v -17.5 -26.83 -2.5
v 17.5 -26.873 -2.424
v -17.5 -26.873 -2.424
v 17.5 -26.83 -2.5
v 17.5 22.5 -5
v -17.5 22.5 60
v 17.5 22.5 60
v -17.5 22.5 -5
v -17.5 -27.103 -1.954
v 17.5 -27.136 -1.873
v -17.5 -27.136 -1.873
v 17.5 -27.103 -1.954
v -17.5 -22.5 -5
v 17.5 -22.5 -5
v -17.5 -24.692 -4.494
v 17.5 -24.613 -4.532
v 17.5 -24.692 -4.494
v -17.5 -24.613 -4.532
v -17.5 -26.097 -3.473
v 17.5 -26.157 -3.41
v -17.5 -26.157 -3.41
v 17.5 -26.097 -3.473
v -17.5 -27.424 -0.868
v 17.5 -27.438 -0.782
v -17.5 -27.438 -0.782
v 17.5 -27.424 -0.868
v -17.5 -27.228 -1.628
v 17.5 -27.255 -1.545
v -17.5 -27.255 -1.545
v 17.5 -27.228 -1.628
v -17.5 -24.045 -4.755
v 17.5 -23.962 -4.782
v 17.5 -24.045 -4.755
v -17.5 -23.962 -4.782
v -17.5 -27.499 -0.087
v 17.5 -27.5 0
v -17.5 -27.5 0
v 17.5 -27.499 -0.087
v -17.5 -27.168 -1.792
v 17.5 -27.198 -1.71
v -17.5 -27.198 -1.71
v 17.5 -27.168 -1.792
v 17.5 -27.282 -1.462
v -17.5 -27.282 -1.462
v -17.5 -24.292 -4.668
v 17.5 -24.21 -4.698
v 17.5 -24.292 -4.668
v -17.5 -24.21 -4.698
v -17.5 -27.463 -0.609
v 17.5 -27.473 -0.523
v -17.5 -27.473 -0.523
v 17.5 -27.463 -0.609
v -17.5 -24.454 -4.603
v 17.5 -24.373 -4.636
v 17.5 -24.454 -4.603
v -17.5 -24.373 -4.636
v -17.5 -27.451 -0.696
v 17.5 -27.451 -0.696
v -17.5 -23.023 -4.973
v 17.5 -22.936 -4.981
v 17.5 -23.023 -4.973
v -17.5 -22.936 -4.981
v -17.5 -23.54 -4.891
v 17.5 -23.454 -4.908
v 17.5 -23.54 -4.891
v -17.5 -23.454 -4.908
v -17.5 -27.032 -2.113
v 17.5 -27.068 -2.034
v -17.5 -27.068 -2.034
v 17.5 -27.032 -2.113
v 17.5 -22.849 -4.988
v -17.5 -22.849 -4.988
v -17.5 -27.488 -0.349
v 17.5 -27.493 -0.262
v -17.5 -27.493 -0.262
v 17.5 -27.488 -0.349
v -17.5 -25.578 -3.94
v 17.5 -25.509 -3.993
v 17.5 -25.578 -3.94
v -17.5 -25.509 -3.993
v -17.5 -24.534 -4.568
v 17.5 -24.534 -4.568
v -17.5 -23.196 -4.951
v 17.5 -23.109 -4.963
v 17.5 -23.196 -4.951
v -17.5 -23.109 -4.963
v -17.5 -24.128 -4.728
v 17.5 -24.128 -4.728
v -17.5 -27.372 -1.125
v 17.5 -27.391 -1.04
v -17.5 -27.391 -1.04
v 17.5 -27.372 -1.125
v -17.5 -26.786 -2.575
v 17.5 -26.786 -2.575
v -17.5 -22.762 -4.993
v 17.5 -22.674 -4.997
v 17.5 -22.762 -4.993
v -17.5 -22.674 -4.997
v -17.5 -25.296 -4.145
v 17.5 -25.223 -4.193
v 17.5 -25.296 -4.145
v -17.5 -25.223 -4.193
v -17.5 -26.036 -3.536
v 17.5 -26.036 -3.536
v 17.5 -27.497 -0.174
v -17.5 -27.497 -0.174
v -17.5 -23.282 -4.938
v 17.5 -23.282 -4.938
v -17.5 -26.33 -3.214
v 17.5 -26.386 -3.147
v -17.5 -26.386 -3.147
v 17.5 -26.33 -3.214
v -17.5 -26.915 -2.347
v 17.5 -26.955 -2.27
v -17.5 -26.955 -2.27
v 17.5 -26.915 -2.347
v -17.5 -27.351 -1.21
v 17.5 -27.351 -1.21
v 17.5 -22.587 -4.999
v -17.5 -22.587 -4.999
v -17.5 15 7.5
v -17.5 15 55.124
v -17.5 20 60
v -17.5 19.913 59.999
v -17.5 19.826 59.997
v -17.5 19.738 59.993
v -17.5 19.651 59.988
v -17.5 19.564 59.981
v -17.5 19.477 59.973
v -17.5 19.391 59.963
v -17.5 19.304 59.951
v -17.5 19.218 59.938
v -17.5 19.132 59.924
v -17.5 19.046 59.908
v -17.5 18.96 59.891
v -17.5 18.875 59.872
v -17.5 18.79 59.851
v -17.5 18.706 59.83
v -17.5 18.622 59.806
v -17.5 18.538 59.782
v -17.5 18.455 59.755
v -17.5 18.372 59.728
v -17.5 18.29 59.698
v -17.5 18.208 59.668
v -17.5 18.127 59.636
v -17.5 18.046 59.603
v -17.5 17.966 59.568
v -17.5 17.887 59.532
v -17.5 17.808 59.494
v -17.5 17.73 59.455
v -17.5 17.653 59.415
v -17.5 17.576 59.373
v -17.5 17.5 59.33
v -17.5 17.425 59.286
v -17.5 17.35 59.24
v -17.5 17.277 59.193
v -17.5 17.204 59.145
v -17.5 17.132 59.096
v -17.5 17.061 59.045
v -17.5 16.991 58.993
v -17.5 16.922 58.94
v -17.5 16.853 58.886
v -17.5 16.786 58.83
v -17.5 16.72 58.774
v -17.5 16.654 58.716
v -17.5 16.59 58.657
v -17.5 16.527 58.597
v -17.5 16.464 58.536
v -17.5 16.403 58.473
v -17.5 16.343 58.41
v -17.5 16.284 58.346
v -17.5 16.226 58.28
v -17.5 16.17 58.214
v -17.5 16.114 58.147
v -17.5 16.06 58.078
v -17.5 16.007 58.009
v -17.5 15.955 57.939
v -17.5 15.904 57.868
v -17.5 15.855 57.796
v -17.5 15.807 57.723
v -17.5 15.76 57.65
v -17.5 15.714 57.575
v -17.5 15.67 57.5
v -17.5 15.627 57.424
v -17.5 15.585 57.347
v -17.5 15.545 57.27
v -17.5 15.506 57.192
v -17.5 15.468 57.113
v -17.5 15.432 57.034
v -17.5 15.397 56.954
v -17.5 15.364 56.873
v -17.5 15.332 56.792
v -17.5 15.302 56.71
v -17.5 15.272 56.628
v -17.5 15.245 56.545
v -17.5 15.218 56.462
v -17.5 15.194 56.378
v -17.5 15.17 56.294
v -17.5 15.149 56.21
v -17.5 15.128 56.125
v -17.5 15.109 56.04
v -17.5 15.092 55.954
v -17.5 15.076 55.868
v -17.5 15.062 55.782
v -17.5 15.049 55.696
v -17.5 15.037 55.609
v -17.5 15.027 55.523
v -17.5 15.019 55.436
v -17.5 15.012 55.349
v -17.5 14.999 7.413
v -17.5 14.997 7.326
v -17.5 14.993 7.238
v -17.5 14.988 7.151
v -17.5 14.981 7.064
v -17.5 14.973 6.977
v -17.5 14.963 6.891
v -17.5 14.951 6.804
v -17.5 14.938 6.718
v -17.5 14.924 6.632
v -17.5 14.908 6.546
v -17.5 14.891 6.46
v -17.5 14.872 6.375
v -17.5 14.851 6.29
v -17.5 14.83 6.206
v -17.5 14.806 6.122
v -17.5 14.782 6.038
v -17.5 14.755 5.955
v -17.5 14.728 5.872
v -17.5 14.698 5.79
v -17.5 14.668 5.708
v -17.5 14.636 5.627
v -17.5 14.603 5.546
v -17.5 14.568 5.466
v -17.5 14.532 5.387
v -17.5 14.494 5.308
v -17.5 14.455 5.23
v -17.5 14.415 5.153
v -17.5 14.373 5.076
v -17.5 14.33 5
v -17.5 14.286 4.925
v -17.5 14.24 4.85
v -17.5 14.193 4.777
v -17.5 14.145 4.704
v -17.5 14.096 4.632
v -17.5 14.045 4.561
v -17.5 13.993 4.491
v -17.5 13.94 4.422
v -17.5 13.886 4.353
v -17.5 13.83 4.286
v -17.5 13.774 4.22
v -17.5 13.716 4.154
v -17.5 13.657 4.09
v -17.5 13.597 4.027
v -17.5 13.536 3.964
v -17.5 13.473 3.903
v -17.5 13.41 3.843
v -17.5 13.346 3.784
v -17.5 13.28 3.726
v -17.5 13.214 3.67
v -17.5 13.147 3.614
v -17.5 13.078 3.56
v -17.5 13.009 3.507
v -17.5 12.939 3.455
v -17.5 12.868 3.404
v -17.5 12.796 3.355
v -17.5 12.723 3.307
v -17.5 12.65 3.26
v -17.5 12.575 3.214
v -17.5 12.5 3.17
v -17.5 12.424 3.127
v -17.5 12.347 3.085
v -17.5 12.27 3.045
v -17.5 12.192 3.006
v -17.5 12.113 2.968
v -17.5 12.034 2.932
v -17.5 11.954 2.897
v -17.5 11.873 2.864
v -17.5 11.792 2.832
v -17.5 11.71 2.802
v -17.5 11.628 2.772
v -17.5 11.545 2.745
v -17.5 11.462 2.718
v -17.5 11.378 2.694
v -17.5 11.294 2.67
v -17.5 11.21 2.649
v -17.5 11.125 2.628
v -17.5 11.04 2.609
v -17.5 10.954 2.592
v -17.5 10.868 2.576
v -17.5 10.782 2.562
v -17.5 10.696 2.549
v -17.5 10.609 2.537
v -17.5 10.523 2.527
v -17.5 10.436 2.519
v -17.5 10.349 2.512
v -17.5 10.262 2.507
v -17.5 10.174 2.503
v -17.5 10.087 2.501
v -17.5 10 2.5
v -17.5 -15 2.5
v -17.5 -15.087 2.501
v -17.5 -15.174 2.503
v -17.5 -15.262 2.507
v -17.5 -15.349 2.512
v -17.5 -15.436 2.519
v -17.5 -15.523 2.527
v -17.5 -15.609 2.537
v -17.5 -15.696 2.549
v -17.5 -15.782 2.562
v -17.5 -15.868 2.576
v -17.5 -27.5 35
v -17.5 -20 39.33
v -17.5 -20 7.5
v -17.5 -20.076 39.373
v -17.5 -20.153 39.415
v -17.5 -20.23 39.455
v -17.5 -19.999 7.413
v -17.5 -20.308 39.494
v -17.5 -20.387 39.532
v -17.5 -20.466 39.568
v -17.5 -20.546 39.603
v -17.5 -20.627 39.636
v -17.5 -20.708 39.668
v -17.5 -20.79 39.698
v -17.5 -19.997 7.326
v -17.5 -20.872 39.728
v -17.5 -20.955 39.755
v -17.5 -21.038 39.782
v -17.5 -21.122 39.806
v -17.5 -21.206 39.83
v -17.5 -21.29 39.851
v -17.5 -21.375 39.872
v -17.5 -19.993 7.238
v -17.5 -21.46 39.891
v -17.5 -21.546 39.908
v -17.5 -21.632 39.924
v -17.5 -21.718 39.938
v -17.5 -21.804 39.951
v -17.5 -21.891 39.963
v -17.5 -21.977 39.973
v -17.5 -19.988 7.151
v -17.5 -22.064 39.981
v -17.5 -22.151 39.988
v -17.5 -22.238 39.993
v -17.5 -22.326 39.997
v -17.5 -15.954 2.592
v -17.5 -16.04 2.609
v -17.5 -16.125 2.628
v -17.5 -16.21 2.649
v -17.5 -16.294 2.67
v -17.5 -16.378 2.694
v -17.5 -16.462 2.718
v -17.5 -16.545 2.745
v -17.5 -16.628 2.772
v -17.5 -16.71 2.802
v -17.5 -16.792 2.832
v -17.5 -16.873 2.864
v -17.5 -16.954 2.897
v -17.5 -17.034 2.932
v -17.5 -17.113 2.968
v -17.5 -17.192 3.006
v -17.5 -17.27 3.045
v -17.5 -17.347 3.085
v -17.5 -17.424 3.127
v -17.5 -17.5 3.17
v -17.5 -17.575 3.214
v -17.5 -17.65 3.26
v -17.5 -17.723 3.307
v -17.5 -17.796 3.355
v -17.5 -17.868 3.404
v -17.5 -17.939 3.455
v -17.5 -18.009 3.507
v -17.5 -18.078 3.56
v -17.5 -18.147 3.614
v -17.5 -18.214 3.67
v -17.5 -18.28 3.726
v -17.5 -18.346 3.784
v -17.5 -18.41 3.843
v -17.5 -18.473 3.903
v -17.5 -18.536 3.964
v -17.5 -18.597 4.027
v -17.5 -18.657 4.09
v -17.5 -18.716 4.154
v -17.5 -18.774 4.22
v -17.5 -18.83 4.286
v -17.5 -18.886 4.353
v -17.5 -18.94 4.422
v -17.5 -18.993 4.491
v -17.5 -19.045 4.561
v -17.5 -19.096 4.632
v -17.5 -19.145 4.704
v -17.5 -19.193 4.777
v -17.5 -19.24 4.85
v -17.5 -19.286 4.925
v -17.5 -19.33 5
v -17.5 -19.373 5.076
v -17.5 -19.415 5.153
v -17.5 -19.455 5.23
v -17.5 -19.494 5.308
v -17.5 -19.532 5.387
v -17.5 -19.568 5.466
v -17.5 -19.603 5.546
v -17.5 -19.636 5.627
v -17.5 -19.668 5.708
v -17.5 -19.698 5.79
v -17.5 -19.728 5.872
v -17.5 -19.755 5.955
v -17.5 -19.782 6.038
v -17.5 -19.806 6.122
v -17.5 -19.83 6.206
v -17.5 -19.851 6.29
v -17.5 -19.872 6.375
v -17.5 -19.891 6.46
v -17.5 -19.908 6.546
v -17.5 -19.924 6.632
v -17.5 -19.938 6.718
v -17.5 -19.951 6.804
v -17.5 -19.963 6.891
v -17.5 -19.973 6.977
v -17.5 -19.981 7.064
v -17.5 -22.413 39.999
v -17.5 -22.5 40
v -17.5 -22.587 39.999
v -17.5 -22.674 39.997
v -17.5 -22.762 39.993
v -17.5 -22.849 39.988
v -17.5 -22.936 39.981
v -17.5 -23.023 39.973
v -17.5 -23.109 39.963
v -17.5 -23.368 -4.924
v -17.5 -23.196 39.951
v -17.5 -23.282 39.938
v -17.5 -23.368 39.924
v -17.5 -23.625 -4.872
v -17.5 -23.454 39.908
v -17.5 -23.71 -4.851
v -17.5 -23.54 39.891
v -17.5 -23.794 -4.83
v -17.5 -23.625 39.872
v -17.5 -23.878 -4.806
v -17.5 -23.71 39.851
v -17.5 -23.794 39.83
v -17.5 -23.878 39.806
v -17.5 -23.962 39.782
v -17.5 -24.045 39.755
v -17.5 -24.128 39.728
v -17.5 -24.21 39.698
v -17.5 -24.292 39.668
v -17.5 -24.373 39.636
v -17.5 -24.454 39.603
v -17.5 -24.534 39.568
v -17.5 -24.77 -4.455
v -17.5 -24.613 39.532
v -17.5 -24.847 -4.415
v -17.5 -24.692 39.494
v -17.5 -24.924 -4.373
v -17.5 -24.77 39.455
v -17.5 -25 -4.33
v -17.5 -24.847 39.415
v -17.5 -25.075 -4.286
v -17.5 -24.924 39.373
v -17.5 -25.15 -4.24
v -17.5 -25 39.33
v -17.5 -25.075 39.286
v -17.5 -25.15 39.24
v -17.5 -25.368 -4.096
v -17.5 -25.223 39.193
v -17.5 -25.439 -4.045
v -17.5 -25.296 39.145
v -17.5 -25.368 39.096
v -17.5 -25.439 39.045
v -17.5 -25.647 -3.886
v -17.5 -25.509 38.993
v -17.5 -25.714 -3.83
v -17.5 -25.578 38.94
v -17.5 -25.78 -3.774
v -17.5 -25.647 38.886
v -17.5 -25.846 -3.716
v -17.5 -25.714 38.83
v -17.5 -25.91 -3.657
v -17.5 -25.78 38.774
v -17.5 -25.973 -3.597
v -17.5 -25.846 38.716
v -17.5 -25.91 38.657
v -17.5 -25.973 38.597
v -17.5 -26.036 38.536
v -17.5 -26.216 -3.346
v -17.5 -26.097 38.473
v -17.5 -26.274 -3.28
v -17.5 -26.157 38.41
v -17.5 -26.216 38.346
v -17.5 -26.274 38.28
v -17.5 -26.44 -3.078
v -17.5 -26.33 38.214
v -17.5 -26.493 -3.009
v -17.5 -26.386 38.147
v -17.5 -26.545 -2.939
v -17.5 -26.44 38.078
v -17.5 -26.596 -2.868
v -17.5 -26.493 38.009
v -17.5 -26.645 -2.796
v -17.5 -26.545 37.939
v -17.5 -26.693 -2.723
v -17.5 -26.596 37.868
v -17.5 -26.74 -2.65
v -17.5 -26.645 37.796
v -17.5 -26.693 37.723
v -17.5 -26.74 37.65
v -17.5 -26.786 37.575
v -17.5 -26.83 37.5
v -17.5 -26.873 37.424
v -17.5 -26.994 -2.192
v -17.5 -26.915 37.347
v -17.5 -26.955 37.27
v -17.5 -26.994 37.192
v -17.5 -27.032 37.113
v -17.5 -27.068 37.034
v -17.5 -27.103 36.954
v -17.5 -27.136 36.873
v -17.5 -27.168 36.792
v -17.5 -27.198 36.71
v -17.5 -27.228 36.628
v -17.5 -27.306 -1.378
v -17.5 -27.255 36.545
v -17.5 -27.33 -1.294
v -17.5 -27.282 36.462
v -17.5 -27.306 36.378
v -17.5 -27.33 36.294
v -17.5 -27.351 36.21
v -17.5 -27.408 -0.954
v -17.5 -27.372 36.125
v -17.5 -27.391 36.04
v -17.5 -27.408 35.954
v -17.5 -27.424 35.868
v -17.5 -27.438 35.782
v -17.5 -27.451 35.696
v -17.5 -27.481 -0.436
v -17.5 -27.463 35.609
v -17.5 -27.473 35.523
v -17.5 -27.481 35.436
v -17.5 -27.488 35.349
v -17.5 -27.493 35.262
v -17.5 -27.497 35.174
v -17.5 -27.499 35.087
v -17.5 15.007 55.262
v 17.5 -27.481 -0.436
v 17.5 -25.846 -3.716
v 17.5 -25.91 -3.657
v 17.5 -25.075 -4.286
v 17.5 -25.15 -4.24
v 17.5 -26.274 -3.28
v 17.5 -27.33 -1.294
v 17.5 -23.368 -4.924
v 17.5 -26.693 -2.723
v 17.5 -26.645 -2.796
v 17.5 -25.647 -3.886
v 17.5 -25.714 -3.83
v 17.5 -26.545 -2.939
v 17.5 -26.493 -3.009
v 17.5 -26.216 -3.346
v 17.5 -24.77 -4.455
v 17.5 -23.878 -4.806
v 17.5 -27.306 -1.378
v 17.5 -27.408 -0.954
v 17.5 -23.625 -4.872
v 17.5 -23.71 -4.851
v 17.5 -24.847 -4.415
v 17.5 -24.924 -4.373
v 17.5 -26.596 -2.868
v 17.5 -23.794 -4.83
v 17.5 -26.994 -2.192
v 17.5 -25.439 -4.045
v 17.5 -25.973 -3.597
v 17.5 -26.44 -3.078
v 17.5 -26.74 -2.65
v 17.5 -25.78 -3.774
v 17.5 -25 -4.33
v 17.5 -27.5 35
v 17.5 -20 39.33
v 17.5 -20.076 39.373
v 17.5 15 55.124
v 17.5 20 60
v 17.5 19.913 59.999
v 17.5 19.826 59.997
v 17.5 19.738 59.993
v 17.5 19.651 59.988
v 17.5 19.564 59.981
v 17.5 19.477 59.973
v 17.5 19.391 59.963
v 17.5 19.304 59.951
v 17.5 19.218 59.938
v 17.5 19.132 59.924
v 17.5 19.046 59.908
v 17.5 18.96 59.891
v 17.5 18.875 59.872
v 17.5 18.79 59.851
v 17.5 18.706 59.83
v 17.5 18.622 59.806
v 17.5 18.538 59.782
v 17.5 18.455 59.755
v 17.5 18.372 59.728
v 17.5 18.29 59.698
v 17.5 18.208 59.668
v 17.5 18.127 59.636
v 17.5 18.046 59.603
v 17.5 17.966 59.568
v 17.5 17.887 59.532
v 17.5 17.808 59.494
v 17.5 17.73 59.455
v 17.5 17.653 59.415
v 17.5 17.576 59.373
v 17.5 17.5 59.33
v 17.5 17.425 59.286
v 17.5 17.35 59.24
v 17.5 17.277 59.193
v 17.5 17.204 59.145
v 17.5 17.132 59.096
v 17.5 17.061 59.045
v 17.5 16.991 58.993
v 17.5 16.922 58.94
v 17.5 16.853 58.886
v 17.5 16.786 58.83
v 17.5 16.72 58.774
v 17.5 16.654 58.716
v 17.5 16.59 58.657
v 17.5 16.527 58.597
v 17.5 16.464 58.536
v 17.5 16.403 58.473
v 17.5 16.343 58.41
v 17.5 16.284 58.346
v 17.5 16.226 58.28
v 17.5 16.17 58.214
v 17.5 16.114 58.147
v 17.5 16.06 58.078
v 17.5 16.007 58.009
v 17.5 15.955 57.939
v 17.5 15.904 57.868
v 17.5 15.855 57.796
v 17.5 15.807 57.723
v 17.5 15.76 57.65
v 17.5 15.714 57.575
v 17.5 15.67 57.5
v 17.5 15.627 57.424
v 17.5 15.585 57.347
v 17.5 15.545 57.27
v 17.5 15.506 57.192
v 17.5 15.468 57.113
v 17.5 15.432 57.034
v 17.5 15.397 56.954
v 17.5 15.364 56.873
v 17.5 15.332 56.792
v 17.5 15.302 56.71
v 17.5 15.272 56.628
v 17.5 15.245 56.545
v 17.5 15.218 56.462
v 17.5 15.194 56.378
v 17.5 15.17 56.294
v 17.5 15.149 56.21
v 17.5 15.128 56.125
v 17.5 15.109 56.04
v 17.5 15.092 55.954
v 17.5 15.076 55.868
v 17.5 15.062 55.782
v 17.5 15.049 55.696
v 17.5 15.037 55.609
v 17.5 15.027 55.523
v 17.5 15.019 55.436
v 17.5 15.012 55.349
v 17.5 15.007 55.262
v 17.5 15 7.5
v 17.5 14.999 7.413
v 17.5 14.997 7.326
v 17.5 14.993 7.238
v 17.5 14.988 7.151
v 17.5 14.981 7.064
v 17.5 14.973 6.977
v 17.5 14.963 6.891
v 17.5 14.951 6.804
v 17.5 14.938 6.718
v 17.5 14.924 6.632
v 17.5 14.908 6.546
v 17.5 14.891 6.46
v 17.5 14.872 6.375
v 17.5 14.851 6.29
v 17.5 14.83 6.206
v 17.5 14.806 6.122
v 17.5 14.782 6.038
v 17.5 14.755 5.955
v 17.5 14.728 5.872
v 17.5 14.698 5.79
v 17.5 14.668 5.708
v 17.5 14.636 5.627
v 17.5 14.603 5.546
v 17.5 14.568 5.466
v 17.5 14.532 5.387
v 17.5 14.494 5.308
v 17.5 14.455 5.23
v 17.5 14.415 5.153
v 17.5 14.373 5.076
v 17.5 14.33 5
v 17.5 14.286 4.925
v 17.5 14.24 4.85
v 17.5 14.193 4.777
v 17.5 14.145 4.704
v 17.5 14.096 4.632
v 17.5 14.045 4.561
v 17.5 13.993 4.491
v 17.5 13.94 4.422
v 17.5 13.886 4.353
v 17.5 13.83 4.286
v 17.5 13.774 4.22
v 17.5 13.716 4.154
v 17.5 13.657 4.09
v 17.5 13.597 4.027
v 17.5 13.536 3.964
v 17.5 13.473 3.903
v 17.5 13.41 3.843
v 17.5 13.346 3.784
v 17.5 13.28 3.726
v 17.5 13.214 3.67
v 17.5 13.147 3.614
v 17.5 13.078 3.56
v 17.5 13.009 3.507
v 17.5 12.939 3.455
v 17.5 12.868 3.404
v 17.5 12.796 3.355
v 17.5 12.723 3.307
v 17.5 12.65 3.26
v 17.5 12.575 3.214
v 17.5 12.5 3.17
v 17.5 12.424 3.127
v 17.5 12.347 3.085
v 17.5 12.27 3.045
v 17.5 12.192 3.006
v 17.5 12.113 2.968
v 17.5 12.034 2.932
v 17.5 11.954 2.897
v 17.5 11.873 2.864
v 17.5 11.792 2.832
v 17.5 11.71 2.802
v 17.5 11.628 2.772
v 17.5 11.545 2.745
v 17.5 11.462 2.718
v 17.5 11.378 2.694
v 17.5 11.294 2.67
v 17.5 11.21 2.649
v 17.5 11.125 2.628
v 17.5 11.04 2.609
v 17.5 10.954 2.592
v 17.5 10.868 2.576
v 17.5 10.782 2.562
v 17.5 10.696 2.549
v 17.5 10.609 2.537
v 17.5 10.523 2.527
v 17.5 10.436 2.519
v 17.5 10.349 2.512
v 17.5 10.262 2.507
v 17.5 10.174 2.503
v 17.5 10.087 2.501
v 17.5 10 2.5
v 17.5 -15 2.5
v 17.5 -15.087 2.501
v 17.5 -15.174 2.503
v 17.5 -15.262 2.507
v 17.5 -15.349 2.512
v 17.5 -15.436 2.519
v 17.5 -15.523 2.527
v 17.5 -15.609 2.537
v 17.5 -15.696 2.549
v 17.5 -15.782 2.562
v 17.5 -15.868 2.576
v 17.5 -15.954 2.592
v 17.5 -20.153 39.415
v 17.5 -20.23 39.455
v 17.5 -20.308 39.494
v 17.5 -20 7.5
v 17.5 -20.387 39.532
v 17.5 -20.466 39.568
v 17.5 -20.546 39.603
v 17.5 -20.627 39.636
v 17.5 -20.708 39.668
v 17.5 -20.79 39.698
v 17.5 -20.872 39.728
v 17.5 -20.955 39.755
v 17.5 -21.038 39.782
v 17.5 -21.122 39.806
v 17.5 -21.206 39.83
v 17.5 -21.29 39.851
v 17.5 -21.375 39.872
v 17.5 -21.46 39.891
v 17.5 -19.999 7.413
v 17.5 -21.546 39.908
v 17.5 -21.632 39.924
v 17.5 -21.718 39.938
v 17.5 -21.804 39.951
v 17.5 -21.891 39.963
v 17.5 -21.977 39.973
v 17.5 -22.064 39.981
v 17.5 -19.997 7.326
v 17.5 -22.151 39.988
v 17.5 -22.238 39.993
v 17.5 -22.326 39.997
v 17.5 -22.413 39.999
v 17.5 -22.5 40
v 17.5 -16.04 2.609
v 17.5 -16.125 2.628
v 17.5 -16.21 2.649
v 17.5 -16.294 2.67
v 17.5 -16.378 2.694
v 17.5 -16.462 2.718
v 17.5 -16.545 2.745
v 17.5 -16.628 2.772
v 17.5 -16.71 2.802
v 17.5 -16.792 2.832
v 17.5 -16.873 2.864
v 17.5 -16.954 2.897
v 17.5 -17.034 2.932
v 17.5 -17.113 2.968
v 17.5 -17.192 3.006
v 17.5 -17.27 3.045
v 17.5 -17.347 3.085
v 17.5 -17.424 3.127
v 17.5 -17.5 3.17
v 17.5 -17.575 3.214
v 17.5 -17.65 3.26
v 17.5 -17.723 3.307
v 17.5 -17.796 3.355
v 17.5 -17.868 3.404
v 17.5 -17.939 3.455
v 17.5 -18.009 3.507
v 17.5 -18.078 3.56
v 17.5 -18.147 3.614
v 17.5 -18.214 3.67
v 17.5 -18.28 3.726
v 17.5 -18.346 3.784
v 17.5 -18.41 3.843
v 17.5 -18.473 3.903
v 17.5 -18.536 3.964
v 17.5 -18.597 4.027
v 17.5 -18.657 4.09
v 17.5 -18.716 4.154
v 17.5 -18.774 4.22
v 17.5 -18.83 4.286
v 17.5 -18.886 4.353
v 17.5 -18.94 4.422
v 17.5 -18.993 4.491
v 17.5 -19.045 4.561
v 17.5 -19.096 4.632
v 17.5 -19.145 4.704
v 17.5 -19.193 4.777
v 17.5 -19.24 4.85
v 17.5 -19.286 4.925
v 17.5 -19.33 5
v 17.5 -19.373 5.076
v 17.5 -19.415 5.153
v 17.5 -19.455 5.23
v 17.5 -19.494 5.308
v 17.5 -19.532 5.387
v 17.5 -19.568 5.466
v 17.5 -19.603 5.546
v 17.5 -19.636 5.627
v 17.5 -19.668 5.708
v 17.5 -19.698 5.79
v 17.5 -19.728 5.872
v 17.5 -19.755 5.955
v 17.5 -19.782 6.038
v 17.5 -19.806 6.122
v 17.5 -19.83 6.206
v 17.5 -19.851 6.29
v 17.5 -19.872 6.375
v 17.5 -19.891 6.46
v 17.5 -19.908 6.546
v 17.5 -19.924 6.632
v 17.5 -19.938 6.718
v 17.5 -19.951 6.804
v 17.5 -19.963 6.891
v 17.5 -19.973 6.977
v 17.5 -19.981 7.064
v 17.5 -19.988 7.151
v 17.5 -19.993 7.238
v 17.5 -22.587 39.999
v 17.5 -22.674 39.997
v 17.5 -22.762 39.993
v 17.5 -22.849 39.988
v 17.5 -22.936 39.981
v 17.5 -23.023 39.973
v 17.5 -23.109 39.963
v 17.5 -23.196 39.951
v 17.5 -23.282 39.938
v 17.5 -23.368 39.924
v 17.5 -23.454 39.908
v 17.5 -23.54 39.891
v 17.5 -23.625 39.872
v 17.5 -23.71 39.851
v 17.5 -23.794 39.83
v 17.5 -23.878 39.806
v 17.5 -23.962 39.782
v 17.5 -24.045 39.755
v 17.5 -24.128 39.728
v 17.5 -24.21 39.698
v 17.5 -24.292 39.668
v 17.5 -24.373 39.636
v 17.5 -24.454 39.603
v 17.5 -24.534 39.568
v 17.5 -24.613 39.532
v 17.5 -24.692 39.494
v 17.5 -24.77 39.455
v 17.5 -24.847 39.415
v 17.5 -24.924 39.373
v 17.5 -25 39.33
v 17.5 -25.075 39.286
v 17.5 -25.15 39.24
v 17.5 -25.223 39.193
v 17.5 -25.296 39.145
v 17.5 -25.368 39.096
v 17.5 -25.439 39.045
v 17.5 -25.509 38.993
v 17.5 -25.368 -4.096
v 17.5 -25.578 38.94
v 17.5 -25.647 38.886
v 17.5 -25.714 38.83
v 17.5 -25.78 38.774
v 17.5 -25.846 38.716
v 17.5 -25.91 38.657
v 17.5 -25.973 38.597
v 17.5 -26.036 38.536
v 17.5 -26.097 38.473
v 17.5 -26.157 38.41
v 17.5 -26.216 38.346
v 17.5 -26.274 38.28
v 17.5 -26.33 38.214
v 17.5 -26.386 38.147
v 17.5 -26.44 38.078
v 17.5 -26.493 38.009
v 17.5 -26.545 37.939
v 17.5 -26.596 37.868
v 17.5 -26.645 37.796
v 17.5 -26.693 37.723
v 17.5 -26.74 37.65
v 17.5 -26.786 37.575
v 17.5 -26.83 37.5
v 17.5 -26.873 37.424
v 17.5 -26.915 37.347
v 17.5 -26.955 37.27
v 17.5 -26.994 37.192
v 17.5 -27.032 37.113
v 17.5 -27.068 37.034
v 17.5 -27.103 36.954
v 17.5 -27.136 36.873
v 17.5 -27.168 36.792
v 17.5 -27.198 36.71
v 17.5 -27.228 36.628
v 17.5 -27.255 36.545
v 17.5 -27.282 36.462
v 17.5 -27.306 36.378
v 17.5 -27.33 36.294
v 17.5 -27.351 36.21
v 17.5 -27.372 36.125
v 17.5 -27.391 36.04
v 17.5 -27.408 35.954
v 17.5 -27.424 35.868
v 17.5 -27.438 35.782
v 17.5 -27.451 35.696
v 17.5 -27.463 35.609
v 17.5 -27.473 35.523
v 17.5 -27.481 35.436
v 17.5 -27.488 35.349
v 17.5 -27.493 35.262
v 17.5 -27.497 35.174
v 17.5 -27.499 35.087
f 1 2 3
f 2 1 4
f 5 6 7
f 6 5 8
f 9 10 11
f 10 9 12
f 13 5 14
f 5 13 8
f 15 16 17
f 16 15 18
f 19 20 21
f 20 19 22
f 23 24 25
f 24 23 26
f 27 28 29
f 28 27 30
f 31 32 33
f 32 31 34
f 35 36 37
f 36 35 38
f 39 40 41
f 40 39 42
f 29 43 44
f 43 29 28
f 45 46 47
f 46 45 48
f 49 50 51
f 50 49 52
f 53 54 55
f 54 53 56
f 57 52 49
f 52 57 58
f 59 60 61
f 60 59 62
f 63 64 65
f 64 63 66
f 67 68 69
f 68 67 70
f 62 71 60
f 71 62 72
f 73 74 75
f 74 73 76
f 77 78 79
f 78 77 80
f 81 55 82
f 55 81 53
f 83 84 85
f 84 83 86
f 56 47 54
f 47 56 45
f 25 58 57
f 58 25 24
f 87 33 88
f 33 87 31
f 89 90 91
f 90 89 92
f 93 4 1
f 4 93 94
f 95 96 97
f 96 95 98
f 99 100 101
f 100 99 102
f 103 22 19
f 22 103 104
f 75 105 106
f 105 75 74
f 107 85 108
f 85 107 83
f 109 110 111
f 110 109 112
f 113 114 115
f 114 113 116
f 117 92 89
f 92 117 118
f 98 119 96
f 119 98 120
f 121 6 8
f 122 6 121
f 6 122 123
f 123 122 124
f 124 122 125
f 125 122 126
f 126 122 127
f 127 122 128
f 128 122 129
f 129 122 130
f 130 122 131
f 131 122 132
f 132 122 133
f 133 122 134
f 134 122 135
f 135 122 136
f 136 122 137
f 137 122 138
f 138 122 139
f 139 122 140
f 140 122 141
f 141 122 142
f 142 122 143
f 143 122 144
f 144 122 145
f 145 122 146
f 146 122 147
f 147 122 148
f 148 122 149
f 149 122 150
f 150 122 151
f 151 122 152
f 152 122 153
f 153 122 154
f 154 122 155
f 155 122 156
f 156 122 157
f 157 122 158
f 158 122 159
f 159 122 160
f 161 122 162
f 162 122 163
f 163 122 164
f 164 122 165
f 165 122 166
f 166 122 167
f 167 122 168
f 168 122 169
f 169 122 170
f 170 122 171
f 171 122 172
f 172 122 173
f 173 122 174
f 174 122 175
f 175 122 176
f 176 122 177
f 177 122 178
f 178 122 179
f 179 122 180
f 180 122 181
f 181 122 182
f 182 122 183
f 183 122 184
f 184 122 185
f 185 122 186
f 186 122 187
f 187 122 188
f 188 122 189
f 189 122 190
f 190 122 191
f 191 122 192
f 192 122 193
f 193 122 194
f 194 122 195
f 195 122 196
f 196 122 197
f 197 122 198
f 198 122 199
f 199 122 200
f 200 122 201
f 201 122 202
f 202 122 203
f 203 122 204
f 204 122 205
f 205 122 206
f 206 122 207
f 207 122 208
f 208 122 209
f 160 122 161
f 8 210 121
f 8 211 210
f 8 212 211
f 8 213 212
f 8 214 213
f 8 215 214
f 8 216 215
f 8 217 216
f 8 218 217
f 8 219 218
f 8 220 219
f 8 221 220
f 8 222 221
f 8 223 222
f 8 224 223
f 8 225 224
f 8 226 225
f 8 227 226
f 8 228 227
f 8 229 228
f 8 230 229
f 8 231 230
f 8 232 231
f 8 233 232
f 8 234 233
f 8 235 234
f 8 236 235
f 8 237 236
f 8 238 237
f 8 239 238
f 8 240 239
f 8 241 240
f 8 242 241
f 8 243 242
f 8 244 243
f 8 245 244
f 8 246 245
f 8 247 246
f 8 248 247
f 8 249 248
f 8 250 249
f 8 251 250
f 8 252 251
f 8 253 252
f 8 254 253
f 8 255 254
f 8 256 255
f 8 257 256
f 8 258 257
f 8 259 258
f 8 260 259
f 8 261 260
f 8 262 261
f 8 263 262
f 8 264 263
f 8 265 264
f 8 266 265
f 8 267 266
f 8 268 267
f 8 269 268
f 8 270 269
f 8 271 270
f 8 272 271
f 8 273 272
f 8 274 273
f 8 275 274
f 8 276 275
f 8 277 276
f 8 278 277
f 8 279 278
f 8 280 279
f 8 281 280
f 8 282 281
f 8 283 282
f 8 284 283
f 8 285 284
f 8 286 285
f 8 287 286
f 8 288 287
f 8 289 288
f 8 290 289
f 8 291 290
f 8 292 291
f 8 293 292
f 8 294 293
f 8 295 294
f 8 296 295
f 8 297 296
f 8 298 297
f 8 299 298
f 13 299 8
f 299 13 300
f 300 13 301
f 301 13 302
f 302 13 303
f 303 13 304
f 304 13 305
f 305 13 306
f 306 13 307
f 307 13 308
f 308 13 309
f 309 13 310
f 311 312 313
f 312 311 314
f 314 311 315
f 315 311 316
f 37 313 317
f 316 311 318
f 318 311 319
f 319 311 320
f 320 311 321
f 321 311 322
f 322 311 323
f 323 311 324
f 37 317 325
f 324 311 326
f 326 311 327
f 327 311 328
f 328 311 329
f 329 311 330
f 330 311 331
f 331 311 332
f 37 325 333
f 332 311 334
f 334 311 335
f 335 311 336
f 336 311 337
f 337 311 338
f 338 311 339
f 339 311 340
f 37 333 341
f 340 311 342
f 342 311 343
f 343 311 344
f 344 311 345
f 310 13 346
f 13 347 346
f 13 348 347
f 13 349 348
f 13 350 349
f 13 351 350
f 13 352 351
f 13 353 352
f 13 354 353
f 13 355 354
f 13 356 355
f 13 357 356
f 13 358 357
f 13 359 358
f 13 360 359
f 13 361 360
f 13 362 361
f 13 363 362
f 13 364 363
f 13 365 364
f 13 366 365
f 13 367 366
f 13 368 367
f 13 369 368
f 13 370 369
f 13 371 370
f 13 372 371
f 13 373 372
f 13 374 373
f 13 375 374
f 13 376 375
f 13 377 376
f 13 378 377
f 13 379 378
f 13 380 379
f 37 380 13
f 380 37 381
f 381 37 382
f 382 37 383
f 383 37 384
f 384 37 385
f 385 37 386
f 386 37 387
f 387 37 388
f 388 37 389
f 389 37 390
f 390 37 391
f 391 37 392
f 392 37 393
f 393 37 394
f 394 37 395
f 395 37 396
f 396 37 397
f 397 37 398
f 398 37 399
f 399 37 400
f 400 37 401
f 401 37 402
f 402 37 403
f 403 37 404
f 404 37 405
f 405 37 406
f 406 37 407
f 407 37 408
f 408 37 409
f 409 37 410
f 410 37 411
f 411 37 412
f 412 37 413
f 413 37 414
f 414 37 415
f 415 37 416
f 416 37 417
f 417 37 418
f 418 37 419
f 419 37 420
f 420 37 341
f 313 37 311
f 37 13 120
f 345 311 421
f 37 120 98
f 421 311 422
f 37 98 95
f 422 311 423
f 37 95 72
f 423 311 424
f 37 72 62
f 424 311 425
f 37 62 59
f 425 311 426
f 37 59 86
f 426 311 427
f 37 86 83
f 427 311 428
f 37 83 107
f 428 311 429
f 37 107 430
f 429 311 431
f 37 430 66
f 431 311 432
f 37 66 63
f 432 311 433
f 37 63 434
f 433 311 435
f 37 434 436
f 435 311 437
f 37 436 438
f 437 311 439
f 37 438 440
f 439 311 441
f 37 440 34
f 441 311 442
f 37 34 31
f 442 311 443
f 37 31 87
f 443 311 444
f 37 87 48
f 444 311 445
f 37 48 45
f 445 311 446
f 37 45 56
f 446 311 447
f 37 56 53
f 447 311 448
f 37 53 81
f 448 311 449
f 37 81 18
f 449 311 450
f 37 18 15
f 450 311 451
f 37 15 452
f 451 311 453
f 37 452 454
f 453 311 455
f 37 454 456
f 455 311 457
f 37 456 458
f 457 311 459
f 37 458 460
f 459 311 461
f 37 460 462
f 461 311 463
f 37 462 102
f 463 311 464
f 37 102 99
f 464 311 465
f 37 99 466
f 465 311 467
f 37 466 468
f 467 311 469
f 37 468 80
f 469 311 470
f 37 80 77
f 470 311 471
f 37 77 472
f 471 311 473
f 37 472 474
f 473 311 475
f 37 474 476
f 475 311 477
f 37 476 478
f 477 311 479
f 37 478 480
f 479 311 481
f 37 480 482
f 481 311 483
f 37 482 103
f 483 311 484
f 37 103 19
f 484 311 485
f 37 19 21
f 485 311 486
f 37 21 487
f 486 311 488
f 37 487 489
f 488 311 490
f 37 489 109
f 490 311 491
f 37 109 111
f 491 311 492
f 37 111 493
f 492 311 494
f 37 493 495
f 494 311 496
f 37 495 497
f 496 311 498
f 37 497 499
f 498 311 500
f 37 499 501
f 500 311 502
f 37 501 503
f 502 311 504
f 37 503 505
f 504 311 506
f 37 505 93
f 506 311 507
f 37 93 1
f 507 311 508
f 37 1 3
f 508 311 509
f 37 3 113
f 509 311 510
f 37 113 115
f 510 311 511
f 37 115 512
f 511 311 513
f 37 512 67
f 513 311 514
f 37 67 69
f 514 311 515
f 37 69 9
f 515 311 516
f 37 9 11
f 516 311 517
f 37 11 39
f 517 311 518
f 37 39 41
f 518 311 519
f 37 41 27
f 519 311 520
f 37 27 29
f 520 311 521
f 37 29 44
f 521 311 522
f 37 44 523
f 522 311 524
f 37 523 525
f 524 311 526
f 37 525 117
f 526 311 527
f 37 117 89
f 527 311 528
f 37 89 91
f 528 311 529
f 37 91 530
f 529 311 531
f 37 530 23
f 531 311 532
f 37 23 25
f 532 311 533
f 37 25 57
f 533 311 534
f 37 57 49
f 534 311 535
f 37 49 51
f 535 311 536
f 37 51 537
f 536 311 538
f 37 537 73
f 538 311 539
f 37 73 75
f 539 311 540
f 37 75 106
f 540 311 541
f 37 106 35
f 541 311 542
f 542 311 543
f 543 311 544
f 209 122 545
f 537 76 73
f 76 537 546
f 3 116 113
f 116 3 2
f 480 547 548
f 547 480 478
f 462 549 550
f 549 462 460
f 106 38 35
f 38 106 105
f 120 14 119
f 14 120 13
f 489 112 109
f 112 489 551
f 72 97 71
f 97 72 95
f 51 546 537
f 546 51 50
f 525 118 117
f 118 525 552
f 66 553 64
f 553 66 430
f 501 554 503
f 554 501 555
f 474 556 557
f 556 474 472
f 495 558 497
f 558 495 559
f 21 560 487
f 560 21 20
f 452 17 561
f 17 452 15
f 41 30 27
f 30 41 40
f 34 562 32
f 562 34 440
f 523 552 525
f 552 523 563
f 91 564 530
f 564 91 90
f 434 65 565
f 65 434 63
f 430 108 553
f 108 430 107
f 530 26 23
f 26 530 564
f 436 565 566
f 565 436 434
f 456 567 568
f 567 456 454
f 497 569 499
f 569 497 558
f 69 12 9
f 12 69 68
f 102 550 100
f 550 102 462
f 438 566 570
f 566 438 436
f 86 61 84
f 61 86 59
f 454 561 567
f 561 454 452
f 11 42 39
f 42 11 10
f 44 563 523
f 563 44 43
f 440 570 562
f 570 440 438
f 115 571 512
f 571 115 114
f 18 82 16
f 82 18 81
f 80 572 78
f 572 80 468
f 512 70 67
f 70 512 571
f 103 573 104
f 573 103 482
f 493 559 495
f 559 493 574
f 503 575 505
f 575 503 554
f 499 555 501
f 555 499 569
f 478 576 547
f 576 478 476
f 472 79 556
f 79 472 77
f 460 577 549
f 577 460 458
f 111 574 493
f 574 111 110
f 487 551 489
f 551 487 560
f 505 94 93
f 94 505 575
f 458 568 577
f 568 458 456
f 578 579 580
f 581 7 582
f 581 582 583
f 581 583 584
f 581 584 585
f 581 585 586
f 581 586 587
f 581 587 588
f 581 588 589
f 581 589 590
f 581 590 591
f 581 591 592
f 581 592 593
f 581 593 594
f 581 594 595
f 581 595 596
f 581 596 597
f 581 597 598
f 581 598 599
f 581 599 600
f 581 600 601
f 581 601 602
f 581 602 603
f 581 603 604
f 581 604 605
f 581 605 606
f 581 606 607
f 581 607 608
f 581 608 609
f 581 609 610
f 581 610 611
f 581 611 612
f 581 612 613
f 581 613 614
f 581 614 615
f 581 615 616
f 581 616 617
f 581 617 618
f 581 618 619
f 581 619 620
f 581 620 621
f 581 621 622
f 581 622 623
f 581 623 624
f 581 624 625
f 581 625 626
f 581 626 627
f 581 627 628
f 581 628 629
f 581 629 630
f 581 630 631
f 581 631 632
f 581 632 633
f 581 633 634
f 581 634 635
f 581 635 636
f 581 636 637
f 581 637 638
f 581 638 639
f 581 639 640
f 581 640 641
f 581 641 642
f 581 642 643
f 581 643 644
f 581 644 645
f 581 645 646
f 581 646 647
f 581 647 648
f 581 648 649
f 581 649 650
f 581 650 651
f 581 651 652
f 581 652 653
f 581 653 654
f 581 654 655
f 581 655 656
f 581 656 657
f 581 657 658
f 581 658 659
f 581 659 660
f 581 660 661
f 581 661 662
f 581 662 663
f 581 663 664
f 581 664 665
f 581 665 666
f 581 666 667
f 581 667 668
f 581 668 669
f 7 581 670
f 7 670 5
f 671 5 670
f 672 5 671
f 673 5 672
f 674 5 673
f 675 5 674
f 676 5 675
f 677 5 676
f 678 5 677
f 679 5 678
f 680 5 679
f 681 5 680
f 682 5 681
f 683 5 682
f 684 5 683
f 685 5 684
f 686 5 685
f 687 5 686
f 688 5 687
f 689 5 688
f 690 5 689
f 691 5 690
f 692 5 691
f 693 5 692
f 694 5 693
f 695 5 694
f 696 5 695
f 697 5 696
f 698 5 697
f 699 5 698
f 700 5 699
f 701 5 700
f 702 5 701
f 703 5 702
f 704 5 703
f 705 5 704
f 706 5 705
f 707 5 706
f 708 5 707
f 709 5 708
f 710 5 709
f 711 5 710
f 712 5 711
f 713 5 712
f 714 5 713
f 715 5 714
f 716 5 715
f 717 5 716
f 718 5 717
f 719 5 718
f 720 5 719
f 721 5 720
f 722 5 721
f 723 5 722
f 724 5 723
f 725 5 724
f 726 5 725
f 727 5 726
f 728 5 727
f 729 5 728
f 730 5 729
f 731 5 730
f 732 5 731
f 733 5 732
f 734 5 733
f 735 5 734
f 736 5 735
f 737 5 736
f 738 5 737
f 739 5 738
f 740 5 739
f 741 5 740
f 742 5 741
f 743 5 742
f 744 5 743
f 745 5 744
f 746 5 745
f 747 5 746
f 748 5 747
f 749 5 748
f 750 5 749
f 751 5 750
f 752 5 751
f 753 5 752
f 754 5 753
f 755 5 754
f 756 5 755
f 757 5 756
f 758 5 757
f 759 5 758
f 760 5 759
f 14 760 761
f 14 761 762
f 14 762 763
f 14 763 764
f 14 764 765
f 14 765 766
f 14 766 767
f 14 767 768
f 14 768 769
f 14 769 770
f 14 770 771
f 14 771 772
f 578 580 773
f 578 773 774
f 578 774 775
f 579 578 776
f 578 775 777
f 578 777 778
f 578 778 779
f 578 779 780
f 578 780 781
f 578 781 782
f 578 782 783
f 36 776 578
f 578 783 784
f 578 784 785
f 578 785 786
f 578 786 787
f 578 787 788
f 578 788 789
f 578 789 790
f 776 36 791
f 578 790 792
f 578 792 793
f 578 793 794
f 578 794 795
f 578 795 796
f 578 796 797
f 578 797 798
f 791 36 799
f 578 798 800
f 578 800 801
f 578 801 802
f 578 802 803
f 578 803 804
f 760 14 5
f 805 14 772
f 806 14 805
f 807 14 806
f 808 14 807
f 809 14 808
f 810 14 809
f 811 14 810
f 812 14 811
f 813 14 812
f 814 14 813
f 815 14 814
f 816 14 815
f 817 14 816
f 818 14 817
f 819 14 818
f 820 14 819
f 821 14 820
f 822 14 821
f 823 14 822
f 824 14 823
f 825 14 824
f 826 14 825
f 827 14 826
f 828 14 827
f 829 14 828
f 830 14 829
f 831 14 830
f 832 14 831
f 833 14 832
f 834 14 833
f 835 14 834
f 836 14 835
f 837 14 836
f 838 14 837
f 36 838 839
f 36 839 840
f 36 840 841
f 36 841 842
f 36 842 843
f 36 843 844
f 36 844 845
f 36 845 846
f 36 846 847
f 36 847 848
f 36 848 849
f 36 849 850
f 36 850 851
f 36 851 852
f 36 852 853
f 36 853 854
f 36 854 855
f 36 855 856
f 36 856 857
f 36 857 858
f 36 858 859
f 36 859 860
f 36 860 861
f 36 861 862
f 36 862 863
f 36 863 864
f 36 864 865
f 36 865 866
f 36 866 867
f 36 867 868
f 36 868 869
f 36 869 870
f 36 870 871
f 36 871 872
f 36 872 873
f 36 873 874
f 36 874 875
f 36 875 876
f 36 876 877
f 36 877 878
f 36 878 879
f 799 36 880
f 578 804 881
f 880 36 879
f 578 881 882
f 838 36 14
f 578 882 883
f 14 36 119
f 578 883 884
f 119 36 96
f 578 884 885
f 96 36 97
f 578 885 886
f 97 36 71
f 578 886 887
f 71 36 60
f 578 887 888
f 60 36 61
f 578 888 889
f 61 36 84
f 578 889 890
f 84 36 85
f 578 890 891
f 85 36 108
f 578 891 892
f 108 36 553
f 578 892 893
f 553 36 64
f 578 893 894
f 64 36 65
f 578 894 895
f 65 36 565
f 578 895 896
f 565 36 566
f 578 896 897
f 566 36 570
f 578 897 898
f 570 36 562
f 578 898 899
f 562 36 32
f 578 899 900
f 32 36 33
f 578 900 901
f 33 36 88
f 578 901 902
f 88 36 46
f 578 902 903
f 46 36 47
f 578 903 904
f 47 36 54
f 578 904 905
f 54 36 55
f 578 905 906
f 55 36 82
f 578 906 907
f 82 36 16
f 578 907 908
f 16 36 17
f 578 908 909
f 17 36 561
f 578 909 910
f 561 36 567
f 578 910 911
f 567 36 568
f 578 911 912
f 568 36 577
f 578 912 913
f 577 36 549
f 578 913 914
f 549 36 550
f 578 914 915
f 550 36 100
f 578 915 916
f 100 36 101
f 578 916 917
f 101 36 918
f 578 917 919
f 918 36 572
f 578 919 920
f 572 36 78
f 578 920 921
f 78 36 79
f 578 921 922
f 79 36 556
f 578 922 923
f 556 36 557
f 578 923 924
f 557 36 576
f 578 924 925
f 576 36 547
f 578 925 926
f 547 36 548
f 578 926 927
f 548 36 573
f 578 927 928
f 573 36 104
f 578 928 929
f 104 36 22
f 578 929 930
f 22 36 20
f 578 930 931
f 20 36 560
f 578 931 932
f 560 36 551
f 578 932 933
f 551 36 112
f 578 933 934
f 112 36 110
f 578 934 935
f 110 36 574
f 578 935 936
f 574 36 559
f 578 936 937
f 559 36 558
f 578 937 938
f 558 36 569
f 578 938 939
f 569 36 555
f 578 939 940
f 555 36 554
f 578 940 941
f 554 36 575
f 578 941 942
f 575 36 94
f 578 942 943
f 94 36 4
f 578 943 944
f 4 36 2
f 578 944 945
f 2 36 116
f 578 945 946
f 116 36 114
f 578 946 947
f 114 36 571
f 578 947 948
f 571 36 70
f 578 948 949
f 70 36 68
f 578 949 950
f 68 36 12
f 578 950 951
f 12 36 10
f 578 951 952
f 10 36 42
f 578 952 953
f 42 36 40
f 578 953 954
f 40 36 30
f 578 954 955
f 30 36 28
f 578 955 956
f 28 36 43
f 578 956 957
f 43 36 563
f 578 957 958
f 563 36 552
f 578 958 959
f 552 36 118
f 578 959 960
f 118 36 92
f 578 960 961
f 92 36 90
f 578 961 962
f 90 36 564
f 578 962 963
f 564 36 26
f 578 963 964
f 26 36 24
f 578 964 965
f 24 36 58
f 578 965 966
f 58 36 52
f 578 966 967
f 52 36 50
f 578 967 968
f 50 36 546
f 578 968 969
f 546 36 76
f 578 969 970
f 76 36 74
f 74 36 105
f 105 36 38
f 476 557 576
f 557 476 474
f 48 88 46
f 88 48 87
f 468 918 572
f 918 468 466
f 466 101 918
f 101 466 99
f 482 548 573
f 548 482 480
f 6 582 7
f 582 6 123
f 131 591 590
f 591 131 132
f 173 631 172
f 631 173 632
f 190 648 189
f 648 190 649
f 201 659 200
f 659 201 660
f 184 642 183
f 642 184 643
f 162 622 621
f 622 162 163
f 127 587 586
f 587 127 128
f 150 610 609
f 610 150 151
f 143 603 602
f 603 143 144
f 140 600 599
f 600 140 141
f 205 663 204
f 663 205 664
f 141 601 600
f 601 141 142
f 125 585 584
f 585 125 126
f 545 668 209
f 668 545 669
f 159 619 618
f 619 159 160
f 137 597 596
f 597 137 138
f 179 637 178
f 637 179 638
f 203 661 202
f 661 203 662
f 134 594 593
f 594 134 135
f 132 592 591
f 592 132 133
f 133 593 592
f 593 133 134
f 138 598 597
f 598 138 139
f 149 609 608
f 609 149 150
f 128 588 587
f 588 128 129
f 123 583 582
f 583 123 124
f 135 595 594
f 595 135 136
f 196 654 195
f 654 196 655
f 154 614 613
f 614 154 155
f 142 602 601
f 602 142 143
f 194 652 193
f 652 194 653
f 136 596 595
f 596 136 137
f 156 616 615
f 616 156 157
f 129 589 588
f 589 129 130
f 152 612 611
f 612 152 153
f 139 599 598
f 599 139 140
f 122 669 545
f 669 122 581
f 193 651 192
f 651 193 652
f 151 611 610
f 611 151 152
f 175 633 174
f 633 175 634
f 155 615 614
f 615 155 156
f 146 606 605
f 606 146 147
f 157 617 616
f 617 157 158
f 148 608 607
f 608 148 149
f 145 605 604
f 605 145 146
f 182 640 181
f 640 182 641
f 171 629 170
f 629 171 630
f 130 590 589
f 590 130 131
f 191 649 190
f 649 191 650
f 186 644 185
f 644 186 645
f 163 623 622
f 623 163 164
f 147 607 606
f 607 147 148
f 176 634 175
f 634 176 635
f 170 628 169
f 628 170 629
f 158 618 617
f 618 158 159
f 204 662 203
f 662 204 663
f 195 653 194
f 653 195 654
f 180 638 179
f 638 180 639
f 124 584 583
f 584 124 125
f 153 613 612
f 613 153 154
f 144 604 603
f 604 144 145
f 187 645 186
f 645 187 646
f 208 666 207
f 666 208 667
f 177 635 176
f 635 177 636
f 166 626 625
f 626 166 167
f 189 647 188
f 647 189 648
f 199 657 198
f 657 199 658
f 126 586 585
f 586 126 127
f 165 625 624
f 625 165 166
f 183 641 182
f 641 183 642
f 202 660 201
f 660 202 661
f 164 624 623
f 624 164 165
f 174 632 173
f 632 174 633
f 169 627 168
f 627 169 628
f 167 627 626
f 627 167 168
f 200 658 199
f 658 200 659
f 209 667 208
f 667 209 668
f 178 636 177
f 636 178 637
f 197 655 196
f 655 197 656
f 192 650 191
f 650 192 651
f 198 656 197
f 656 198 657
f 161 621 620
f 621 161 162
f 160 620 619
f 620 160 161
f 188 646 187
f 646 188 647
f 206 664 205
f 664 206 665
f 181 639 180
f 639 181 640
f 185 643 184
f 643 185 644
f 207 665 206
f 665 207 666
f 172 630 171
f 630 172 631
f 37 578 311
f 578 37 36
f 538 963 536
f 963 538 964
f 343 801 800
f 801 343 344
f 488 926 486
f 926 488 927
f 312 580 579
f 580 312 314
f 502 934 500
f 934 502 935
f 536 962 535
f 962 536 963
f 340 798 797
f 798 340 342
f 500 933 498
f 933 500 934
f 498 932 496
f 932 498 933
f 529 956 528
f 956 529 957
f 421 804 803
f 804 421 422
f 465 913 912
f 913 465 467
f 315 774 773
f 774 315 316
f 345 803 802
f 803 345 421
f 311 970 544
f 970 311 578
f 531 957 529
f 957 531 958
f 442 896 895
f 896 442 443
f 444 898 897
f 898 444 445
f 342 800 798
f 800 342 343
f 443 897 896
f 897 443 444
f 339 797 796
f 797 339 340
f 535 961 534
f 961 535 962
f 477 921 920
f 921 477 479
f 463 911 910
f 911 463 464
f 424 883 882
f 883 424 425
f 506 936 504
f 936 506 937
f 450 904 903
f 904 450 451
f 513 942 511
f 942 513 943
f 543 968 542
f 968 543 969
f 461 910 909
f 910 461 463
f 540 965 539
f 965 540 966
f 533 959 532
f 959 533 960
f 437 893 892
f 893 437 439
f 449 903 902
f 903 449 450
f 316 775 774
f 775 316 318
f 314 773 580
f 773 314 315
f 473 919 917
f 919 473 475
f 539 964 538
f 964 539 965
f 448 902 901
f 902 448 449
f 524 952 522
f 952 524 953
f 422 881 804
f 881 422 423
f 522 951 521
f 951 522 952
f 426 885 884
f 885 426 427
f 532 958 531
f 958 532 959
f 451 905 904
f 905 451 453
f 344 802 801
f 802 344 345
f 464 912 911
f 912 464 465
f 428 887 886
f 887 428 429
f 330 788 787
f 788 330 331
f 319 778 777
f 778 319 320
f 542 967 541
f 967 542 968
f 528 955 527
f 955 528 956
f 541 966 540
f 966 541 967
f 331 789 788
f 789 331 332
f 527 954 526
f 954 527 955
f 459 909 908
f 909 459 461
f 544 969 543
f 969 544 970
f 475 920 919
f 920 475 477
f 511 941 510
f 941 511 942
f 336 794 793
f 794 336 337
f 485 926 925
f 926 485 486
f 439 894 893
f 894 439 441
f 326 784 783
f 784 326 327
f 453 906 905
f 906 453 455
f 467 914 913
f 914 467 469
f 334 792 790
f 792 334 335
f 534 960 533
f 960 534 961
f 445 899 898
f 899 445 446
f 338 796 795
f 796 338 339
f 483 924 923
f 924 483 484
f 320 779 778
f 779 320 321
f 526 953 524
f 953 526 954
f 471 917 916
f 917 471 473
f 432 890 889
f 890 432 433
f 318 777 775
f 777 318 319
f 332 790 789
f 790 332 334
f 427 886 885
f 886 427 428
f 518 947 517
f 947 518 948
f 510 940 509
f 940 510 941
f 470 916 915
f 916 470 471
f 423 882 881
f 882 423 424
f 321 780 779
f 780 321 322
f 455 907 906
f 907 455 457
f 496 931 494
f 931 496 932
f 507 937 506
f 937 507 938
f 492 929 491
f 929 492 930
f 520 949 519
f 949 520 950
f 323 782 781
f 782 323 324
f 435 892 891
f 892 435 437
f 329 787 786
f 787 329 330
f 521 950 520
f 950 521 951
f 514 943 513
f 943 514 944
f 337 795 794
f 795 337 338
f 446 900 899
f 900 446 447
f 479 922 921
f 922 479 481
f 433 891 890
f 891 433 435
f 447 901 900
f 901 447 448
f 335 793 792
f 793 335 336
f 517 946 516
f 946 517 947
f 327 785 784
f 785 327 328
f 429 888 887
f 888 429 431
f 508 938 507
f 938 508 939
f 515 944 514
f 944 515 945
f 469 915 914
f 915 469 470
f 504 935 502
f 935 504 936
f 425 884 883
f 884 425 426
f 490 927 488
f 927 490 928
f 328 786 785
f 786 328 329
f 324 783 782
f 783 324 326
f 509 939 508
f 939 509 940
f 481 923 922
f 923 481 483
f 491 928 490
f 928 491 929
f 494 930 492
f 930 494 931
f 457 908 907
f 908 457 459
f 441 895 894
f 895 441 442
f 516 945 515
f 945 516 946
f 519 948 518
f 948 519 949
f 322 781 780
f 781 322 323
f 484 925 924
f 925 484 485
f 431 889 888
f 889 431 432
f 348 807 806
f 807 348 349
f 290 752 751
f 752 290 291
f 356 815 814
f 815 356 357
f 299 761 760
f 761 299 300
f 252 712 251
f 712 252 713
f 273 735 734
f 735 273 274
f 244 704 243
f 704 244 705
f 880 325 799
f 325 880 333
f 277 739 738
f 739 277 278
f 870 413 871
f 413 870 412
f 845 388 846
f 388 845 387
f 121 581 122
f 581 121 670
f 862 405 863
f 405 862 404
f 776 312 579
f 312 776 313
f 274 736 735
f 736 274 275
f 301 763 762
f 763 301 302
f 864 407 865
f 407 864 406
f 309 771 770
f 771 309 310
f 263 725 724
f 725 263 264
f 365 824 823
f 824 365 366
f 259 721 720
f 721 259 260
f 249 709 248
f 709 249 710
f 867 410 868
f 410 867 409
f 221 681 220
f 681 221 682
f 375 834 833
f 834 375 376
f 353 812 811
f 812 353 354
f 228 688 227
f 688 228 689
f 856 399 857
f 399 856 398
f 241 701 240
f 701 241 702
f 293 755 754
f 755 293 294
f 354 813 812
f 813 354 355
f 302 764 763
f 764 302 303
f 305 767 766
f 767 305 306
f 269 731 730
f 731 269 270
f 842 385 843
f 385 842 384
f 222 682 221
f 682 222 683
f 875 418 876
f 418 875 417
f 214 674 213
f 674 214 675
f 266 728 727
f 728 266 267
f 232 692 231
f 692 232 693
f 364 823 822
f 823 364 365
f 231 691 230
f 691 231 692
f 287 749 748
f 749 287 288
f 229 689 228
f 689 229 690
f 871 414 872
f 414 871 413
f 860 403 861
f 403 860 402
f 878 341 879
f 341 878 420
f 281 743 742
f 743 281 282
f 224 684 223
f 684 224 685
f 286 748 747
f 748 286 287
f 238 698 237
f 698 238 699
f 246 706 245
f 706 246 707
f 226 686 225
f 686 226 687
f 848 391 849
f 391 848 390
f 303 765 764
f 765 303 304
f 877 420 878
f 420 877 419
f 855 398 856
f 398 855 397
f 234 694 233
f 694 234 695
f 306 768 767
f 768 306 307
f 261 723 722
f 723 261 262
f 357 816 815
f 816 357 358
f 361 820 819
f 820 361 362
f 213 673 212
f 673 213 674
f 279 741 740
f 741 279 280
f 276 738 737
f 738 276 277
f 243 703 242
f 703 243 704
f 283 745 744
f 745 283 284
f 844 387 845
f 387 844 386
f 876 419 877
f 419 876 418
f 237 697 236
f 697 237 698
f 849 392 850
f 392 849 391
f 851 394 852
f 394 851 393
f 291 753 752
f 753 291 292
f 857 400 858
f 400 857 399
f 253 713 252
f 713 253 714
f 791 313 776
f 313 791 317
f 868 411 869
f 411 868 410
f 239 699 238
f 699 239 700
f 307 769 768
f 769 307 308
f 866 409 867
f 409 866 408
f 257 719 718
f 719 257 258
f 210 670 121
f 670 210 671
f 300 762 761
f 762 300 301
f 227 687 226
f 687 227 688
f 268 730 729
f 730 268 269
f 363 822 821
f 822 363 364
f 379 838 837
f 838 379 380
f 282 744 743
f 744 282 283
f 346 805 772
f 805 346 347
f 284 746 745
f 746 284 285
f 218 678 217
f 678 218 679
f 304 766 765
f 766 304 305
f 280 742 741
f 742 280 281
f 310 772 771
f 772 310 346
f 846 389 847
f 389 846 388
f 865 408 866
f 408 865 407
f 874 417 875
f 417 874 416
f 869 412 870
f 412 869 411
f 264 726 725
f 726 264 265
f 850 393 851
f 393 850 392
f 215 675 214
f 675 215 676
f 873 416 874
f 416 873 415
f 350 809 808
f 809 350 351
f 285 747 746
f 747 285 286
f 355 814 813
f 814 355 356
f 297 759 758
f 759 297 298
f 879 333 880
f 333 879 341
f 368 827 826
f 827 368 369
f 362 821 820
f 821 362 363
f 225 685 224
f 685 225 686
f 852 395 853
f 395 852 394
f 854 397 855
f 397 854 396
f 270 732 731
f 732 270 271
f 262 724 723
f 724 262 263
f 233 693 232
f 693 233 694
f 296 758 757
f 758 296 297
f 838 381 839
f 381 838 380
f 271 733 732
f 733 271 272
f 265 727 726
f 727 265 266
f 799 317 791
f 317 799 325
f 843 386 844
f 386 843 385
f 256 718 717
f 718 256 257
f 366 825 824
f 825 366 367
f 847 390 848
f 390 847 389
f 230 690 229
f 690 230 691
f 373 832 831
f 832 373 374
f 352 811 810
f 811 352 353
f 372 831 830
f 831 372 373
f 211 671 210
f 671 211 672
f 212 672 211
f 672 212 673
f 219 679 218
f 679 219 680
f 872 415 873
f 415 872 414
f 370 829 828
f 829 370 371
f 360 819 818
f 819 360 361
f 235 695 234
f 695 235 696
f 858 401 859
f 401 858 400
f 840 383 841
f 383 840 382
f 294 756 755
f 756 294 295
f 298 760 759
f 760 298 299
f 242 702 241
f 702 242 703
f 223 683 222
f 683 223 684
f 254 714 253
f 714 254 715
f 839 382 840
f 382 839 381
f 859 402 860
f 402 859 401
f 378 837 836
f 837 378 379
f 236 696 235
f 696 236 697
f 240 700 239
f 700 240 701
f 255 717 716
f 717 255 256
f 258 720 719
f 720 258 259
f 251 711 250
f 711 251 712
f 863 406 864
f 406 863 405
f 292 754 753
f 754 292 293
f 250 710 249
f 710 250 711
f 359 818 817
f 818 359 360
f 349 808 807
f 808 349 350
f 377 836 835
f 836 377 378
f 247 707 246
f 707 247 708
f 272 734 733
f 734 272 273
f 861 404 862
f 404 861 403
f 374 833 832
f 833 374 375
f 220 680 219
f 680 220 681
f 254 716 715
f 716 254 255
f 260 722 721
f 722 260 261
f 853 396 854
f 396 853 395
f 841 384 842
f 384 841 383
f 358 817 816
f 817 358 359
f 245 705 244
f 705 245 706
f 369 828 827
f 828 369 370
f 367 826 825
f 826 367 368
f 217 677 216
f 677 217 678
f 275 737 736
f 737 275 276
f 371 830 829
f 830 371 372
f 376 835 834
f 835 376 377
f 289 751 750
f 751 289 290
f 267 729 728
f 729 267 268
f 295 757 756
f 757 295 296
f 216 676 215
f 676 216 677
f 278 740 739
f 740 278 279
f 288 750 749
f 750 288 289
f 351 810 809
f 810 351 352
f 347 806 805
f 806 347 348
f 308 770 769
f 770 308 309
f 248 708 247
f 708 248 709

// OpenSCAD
$fn=360;

translate([0,0,35/2]) 
difference() {
    union() {
        hull() {
            translate([0,17.5,17.5]) cube([35,10,10], center=true);
            translate([0,17.5,-17.5]) cube([35,10,10], center=true);
            translate([0,-17.5-5,-17.5]) rotate([0,90,0]) cylinder(d=10,h=35, center=true);
//            translate([0,-17.5,17.5]) rotate([0,90,0]) cylinder(d=10,h=35, center=true);
        }
        hull () {
            difference() {
                translate([0,17.5+2.5,37.5]) rotate([0,90,0]) cylinder(d=10,h=35, center=true);
                translate([0,17.5+7.5,37.5]) cube([35.001,10,10], center=true);
            }
            translate([0,17.5+5-.5,37.5]) cube([35,1,10], center=true);
            translate([0,17.5,-17.5]) cube([35,10,10], center=true);
        }
        hull() {
            translate([0,-17.5-5,-17.5]) rotate([0,90,0]) cylinder(d=10,h=35, center=true);
            translate([0,-17.5-5,17.5]) rotate([0,90,0]) cylinder(d=10,h=35, center=true);
        }
            
    }
    
    

    hull() {
        translate([0,10,-10]) rotate([0,90,0]) cylinder(d=10,h=35.001, center=true);
        translate([0,-10-5,-10]) rotate([0,90,0]) cylinder(d=10,h=35.001, center=true);
        translate([0,10,50]) rotate([0,90,0]) cylinder(d=10,h=35.001, center=true);
        translate([0,-10-5,50]) rotate([0,90,0]) cylinder(d=10,h=35.001, center=true);
    }
    
//    d=30.001;
//    cube([35.1,d,d], center=true);
}

//translate([-30,22.25+$t,-10]) color("lightblue", alpha=.5) cube([60,5,80]);
